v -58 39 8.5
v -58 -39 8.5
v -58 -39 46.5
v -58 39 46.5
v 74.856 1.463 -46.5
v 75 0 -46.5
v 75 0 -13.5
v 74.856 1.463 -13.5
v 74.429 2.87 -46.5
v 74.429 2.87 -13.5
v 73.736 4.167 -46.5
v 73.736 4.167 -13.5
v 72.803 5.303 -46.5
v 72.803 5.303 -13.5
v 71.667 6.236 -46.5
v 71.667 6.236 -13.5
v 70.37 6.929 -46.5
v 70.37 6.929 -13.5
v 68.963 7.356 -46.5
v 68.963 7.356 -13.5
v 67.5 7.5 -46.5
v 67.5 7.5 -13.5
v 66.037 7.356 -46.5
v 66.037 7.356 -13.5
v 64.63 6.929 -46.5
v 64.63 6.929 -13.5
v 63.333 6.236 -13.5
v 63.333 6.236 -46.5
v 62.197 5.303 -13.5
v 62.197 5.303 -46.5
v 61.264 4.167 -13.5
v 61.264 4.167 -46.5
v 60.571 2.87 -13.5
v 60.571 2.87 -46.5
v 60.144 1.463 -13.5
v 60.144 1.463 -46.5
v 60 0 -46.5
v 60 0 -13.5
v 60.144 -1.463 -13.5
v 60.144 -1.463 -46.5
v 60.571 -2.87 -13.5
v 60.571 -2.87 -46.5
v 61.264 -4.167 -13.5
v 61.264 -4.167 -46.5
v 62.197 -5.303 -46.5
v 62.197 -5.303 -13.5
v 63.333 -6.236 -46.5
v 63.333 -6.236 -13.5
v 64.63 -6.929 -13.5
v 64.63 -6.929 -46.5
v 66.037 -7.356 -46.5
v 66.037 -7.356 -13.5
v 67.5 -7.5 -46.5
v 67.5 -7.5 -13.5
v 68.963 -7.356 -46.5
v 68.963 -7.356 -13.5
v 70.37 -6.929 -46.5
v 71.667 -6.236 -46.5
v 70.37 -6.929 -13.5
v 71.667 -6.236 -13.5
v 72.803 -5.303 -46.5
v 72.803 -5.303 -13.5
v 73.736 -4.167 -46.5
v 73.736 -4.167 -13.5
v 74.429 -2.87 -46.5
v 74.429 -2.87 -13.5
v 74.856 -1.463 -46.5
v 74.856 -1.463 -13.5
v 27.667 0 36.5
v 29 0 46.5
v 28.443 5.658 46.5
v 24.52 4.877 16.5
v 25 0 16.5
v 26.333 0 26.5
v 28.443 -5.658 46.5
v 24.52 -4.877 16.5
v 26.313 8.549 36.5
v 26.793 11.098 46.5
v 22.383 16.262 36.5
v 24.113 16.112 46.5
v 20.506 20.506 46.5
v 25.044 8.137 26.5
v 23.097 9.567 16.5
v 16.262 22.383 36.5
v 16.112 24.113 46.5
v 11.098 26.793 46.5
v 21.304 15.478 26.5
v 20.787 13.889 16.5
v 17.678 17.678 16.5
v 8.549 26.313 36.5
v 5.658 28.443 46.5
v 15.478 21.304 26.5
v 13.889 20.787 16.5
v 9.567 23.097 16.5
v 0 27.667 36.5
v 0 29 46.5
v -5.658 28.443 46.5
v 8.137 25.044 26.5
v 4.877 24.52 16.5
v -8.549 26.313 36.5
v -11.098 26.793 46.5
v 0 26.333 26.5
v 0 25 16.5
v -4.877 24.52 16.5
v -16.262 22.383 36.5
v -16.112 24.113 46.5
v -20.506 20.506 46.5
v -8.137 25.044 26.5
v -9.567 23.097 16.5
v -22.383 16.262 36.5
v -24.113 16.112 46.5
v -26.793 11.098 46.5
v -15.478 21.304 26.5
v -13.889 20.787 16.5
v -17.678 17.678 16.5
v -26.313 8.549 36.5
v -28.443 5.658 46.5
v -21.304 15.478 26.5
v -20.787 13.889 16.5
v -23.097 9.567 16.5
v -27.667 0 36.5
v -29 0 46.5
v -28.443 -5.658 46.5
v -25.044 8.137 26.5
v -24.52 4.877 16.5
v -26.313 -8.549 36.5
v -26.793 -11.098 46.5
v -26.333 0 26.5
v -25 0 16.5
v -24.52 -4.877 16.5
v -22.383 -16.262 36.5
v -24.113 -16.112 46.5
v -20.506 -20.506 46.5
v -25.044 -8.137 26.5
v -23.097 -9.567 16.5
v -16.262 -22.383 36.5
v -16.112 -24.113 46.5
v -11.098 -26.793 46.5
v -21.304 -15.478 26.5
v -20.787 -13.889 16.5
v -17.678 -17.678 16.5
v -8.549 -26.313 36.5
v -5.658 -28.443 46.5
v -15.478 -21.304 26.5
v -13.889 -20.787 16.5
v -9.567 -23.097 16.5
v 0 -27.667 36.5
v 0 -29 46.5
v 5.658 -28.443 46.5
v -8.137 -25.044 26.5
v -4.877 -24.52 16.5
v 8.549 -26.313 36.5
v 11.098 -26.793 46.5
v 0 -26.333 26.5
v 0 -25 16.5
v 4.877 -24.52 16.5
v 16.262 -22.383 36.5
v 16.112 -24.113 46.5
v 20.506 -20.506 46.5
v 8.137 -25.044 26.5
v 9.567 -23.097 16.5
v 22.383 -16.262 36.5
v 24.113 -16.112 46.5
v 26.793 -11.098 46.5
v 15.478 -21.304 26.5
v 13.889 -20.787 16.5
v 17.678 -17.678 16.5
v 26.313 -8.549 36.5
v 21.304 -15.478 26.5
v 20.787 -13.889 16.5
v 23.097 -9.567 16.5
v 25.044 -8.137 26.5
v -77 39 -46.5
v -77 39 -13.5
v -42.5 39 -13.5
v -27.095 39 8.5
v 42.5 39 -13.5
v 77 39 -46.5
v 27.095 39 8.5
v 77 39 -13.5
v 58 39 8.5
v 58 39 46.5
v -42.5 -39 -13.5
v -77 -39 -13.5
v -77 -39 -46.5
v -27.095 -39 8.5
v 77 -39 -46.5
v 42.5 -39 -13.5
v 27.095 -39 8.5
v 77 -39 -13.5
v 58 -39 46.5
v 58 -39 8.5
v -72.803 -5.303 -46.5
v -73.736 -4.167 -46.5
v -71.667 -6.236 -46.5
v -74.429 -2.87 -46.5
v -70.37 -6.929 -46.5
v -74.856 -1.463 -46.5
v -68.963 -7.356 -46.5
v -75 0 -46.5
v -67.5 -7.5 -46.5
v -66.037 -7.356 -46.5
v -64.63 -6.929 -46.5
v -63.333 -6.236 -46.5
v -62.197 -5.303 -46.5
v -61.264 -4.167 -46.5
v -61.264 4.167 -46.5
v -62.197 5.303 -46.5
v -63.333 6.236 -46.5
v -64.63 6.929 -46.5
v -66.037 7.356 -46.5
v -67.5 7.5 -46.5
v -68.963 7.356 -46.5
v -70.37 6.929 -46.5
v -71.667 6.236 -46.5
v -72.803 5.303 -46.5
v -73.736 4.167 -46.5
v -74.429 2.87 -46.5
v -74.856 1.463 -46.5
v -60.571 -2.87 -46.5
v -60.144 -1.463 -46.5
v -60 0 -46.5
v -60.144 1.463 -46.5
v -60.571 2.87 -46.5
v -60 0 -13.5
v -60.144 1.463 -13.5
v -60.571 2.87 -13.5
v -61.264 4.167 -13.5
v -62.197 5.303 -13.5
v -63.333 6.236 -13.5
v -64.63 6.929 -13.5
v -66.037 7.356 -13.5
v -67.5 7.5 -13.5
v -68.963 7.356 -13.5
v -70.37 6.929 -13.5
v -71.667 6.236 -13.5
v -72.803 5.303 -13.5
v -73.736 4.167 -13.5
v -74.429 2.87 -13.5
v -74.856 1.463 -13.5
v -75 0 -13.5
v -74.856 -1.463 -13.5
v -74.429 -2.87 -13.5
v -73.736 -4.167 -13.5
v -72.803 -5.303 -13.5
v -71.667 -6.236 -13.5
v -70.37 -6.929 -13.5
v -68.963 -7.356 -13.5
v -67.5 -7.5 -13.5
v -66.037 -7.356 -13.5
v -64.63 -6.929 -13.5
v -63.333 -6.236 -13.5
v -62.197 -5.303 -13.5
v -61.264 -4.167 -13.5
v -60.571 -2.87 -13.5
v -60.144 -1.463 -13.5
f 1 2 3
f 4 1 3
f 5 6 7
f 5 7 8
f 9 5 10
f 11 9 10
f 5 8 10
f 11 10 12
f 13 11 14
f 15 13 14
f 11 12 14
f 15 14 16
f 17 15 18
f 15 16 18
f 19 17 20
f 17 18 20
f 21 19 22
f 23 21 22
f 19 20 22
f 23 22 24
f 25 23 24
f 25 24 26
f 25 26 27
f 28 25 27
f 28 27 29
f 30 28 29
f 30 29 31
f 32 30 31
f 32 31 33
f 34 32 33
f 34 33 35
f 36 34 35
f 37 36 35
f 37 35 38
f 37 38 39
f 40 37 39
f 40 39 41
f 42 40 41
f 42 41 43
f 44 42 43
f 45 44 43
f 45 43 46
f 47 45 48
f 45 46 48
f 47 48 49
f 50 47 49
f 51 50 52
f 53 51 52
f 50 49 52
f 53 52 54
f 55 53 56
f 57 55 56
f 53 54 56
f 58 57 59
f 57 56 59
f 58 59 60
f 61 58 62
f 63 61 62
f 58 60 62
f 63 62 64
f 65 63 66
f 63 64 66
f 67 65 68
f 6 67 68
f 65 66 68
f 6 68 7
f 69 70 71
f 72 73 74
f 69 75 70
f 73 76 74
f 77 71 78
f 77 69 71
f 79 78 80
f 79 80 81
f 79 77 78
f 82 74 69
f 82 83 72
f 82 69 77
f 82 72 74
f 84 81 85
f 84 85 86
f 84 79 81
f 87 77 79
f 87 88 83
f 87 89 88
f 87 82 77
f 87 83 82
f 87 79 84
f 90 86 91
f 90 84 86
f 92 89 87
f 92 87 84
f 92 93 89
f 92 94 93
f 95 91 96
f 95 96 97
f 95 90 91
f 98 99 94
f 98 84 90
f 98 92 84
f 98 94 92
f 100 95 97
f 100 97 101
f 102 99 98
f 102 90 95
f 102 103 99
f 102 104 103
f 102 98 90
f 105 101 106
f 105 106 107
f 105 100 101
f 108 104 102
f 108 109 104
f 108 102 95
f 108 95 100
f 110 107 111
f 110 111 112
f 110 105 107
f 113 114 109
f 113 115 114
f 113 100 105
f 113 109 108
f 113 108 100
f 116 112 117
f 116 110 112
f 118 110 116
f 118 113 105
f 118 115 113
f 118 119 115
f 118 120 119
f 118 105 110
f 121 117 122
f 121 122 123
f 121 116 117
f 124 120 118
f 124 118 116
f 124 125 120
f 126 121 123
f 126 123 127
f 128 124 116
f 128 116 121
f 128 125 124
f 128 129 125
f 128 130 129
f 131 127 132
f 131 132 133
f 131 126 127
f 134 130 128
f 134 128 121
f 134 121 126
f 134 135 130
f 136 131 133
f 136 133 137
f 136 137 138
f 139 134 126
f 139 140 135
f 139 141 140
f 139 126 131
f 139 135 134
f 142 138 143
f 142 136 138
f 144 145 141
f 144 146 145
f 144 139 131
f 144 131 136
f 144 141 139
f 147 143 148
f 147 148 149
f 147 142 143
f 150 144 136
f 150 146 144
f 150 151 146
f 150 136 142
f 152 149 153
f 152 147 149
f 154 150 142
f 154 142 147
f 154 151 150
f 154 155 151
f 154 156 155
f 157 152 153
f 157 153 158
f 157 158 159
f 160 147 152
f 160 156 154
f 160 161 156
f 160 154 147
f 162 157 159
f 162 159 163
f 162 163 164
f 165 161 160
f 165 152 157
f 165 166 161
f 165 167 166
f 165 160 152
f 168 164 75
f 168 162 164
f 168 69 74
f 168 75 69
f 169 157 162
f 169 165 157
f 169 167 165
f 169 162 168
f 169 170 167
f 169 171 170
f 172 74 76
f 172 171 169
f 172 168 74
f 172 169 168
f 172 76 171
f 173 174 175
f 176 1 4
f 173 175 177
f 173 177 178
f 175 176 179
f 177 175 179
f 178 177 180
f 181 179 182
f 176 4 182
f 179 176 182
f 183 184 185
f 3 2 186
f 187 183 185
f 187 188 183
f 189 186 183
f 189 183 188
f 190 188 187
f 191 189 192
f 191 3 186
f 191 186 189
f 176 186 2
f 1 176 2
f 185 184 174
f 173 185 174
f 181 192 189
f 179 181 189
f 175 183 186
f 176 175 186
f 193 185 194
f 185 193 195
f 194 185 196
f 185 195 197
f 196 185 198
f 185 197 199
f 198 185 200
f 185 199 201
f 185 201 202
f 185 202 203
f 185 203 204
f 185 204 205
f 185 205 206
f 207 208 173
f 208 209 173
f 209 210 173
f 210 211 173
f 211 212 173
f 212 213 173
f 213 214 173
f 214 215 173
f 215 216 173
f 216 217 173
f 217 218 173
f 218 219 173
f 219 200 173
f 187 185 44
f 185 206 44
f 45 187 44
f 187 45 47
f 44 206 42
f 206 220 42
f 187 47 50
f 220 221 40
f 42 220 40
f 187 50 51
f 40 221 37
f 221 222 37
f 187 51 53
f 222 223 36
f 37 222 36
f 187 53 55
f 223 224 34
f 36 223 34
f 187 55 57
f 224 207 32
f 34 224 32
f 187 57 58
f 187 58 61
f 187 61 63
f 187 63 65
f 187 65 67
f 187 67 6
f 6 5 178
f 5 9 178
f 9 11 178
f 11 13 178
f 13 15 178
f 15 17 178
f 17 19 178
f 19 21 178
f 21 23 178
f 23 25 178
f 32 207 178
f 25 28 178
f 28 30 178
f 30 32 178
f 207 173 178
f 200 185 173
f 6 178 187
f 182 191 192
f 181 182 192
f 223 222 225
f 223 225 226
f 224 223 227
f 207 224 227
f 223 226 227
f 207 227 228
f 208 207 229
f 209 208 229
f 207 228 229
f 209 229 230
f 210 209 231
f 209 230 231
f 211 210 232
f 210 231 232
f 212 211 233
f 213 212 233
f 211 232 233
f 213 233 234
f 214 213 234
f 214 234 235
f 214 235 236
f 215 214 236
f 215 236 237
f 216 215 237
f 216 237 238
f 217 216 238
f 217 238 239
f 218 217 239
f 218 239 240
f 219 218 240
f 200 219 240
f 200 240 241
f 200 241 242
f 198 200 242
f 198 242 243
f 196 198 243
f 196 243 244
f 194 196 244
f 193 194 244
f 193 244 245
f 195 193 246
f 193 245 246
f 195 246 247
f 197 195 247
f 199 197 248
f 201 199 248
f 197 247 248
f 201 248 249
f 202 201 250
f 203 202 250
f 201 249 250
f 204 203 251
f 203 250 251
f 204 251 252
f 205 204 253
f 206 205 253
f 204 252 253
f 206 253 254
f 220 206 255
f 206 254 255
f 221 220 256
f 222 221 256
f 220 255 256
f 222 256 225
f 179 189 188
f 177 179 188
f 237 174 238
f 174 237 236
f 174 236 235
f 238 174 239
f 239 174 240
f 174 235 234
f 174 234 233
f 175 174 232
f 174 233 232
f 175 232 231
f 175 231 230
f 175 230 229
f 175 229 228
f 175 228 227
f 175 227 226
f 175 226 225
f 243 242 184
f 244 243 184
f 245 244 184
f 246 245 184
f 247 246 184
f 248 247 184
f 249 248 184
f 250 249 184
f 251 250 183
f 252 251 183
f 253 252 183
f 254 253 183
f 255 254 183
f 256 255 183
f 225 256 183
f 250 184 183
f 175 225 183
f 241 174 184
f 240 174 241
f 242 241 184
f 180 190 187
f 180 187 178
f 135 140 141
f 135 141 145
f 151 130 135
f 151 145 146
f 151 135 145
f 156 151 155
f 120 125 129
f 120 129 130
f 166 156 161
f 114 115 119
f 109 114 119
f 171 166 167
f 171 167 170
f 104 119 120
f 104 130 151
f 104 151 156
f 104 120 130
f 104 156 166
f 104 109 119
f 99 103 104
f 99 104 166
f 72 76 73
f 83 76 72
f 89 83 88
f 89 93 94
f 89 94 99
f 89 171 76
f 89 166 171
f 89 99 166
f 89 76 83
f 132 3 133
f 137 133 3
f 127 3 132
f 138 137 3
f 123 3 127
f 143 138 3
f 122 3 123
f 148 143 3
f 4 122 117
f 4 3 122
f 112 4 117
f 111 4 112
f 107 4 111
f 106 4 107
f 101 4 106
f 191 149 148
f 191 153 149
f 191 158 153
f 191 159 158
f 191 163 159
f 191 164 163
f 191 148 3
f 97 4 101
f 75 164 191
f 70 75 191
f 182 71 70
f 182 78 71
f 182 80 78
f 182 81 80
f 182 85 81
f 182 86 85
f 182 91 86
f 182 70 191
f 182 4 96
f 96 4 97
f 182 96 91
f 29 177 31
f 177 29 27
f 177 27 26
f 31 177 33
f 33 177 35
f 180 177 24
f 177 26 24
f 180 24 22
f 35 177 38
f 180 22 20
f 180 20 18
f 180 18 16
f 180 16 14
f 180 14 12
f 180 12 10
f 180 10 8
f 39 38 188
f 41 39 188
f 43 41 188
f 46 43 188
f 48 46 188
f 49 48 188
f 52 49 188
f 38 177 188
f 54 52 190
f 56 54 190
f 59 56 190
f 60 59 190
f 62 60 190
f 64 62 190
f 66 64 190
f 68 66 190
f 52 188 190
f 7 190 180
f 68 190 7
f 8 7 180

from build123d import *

# Parameters (mm, degrees)
F0_W      = 154
F0_H      = 78
F1_DEPTH  = 46.5
F3_DEPTH  = 80
F4_R      = 7.5
F5_DEPTH  = 50
F6_R      = 29
F7_DEPTH  = 30
F8_SIZE2  = 3.99999
F8_SIZE   = 29.99999
F9_R      = 7.5
F10_DEPTH = 40


# Not quite as in the source:
# - a fillet or chamfer is up to 0.001 mm smaller than in the source, because OpenCascade refuses the exact size


with BuildPart() as f1:
    # F0 (on Top) → F1 (new body, symmetric)
    with BuildSketch(Plane.XY):
        Rectangle(F0_W, F0_H)
    extrude(amount=F1_DEPTH, both=True)

    # F2 (on face) → F3 (cut)
    with BuildSketch(Plane.XZ.offset(39)):
        Polygon((-77, 46.5), (-77, -13.5), (-42.5, -13.5), (-27.0954341594, 8.5), (-58, 8.5), (-58, 46.5), align=None)
        Polygon((77, 46.5), (58, 46.5), (58, 8.5), (27.0954341594, 8.5), (42.5, -13.5), (77, -13.5), align=None)
    extrude(amount=-F3_DEPTH, mode=Mode.SUBTRACT)

    # F4 (on face) → F5 (cut)
    with BuildSketch(Plane.XY.offset(-13.5)):
        with Locations((-67.5, 0)):
            Circle(F4_R)
    extrude(amount=-F5_DEPTH, mode=Mode.SUBTRACT)

    # F6 (on face) → F7 (cut)
    with BuildSketch(Plane.XY.offset(46.5)):
        Circle(F6_R)
    extrude(amount=-F7_DEPTH, mode=Mode.SUBTRACT)

    # F8 (size 30 and 4 in the source; OpenCascade refuses exactly that, so slightly less here)
    f8_edges = [f1.edges().sort_by_distance(p)[0] for p in [
        (-29, 0, 16.5),
    ]]
    f8_side = f1.faces().sort_by_distance((-29, 0, 31.5))[0]
    chamfer(f8_edges, length=F8_SIZE, length2=F8_SIZE2, reference=f8_side)

    # F9 (on face) → F10 (cut)
    with BuildSketch(Plane.XY.offset(-13.5)):
        with Locations((67.5, 0)):
            Circle(F9_R)
    extrude(amount=-F10_DEPTH, mode=Mode.SUBTRACT)


solid = f1.part
